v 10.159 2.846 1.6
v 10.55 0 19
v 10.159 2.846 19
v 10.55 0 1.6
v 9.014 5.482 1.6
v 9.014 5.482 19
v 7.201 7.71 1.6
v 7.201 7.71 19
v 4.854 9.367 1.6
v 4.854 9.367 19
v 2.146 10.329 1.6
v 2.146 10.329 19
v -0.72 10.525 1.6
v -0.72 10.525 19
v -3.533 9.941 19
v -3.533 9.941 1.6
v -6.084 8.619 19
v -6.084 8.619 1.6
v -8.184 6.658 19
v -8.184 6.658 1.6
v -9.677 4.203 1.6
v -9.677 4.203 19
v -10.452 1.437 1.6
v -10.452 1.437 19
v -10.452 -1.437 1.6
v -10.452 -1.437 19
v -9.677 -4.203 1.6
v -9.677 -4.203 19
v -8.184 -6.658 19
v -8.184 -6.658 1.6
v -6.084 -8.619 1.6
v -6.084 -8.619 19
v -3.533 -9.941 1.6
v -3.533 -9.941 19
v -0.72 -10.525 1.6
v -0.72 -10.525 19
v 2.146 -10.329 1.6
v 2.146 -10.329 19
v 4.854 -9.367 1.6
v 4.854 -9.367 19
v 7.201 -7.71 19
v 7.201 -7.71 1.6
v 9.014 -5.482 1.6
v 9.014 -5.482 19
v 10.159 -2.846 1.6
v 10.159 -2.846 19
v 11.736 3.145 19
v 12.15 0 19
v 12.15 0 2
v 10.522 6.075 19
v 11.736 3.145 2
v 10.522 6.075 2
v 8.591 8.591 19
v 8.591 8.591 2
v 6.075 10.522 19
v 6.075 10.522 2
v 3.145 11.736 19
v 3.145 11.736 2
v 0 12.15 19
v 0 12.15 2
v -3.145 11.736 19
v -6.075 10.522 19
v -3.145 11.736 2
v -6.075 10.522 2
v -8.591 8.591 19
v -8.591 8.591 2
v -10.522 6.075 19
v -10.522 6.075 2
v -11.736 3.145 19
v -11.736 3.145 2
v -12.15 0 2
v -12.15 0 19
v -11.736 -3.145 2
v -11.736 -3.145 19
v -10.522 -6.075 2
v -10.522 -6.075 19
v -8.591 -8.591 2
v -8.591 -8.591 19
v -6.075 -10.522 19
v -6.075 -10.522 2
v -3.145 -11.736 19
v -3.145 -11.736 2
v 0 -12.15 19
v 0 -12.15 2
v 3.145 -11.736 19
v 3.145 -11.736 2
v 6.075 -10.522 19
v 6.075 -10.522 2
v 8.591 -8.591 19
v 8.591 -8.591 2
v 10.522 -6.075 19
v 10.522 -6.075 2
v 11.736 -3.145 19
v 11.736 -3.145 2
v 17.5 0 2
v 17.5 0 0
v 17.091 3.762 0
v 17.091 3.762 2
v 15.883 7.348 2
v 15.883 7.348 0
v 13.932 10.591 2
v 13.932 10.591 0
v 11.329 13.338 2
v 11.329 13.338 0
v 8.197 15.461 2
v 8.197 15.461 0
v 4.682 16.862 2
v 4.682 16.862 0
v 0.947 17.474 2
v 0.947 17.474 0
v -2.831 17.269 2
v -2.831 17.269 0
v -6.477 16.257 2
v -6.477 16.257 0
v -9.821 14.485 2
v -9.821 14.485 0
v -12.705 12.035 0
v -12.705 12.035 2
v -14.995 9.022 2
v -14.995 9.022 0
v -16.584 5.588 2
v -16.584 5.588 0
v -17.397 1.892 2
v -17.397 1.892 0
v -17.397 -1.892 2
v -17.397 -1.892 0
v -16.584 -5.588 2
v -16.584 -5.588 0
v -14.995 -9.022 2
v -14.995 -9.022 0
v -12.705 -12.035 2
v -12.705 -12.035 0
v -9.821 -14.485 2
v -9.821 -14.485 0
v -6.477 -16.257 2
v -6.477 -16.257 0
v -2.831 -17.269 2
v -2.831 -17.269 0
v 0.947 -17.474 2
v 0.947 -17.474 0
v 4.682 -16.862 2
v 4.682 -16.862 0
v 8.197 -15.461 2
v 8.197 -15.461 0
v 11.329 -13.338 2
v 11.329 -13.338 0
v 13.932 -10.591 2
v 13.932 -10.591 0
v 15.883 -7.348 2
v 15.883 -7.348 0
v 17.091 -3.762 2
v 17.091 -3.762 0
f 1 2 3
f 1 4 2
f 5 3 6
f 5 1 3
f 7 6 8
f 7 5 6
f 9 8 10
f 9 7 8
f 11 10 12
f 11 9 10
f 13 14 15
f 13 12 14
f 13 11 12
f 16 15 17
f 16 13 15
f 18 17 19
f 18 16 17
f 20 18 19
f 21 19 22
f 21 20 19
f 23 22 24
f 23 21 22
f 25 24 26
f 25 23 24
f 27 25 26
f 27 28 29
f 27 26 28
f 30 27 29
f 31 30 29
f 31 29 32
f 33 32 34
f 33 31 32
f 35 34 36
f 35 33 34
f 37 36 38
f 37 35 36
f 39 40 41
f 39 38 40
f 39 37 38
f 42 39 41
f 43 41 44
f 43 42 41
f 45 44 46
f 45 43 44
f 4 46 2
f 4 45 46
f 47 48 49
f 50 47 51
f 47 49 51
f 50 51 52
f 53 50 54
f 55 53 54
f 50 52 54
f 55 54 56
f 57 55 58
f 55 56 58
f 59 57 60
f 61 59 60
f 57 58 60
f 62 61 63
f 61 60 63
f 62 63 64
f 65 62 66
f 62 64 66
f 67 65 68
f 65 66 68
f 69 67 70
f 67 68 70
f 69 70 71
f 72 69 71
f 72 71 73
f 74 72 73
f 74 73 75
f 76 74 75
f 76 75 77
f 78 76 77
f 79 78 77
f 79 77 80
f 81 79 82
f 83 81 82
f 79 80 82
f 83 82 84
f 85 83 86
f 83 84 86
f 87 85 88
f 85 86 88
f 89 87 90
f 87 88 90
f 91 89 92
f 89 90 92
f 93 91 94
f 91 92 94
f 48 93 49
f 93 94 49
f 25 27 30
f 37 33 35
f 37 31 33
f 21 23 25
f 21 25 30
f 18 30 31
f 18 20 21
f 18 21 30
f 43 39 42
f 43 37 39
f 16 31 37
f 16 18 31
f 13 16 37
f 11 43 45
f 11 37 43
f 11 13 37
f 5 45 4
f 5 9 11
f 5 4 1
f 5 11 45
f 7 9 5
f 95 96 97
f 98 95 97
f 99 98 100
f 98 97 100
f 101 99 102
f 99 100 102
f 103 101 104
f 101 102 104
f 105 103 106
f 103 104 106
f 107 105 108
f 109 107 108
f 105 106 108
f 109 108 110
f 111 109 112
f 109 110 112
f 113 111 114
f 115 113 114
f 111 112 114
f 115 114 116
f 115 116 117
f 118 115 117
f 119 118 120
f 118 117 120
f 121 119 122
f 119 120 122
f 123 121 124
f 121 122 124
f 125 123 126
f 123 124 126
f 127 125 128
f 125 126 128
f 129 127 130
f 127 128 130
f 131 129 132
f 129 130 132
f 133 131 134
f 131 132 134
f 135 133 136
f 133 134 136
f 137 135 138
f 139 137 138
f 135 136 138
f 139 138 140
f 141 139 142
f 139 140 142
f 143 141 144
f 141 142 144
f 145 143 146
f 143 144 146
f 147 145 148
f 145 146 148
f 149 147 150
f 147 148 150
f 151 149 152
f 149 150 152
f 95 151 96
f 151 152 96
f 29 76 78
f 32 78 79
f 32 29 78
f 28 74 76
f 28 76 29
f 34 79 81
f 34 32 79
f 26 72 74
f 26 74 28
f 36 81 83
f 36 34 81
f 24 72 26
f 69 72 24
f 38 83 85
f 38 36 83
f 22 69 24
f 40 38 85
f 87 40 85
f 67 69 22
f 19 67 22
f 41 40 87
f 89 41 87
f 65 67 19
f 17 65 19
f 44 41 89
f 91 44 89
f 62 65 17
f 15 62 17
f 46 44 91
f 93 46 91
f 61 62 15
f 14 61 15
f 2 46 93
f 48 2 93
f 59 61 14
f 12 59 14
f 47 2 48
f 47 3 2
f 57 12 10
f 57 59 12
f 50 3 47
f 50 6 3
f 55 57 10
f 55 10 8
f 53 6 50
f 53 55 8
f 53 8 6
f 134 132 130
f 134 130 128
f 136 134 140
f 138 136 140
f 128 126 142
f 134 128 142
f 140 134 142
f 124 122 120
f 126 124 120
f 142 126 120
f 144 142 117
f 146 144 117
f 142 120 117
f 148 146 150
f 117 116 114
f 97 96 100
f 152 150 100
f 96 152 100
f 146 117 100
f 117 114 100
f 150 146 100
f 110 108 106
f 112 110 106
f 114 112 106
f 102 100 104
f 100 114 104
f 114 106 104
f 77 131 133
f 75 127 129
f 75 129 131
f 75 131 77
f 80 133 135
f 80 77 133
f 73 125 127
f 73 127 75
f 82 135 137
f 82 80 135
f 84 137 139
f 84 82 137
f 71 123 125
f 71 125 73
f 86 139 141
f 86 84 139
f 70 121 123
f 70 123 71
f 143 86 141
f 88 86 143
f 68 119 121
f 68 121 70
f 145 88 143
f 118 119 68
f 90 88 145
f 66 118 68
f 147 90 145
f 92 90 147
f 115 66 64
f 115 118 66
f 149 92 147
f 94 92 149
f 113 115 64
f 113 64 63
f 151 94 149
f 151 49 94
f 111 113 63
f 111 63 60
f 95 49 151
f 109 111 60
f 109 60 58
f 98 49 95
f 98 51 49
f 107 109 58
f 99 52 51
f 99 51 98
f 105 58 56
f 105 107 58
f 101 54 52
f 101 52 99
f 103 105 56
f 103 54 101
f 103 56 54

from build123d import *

# Parameters (mm, degrees)
F0_R     = 17.5
F1_DEPTH = 2
F2_R     = 12.15
F3_DEPTH = 17
F4_T     = -1.6


with BuildPart() as f1:
    # F0 (on Top) → F1 (new body)
    with BuildSketch(Plane.XY):
        Circle(F0_R)
    extrude(amount=F1_DEPTH)

    # F2 (on face) → F3 (join)
    with BuildSketch(Plane.XY.offset(2)):
        Circle(F2_R)
    extrude(amount=F3_DEPTH)

    # F4
    f4_openings = [f1.faces().sort_by_distance(p)[0] for p in [
        (0, 0, 19),
    ]]
    offset(amount=F4_T, openings=f4_openings, kind=Kind.INTERSECTION)


solid = f1.part
